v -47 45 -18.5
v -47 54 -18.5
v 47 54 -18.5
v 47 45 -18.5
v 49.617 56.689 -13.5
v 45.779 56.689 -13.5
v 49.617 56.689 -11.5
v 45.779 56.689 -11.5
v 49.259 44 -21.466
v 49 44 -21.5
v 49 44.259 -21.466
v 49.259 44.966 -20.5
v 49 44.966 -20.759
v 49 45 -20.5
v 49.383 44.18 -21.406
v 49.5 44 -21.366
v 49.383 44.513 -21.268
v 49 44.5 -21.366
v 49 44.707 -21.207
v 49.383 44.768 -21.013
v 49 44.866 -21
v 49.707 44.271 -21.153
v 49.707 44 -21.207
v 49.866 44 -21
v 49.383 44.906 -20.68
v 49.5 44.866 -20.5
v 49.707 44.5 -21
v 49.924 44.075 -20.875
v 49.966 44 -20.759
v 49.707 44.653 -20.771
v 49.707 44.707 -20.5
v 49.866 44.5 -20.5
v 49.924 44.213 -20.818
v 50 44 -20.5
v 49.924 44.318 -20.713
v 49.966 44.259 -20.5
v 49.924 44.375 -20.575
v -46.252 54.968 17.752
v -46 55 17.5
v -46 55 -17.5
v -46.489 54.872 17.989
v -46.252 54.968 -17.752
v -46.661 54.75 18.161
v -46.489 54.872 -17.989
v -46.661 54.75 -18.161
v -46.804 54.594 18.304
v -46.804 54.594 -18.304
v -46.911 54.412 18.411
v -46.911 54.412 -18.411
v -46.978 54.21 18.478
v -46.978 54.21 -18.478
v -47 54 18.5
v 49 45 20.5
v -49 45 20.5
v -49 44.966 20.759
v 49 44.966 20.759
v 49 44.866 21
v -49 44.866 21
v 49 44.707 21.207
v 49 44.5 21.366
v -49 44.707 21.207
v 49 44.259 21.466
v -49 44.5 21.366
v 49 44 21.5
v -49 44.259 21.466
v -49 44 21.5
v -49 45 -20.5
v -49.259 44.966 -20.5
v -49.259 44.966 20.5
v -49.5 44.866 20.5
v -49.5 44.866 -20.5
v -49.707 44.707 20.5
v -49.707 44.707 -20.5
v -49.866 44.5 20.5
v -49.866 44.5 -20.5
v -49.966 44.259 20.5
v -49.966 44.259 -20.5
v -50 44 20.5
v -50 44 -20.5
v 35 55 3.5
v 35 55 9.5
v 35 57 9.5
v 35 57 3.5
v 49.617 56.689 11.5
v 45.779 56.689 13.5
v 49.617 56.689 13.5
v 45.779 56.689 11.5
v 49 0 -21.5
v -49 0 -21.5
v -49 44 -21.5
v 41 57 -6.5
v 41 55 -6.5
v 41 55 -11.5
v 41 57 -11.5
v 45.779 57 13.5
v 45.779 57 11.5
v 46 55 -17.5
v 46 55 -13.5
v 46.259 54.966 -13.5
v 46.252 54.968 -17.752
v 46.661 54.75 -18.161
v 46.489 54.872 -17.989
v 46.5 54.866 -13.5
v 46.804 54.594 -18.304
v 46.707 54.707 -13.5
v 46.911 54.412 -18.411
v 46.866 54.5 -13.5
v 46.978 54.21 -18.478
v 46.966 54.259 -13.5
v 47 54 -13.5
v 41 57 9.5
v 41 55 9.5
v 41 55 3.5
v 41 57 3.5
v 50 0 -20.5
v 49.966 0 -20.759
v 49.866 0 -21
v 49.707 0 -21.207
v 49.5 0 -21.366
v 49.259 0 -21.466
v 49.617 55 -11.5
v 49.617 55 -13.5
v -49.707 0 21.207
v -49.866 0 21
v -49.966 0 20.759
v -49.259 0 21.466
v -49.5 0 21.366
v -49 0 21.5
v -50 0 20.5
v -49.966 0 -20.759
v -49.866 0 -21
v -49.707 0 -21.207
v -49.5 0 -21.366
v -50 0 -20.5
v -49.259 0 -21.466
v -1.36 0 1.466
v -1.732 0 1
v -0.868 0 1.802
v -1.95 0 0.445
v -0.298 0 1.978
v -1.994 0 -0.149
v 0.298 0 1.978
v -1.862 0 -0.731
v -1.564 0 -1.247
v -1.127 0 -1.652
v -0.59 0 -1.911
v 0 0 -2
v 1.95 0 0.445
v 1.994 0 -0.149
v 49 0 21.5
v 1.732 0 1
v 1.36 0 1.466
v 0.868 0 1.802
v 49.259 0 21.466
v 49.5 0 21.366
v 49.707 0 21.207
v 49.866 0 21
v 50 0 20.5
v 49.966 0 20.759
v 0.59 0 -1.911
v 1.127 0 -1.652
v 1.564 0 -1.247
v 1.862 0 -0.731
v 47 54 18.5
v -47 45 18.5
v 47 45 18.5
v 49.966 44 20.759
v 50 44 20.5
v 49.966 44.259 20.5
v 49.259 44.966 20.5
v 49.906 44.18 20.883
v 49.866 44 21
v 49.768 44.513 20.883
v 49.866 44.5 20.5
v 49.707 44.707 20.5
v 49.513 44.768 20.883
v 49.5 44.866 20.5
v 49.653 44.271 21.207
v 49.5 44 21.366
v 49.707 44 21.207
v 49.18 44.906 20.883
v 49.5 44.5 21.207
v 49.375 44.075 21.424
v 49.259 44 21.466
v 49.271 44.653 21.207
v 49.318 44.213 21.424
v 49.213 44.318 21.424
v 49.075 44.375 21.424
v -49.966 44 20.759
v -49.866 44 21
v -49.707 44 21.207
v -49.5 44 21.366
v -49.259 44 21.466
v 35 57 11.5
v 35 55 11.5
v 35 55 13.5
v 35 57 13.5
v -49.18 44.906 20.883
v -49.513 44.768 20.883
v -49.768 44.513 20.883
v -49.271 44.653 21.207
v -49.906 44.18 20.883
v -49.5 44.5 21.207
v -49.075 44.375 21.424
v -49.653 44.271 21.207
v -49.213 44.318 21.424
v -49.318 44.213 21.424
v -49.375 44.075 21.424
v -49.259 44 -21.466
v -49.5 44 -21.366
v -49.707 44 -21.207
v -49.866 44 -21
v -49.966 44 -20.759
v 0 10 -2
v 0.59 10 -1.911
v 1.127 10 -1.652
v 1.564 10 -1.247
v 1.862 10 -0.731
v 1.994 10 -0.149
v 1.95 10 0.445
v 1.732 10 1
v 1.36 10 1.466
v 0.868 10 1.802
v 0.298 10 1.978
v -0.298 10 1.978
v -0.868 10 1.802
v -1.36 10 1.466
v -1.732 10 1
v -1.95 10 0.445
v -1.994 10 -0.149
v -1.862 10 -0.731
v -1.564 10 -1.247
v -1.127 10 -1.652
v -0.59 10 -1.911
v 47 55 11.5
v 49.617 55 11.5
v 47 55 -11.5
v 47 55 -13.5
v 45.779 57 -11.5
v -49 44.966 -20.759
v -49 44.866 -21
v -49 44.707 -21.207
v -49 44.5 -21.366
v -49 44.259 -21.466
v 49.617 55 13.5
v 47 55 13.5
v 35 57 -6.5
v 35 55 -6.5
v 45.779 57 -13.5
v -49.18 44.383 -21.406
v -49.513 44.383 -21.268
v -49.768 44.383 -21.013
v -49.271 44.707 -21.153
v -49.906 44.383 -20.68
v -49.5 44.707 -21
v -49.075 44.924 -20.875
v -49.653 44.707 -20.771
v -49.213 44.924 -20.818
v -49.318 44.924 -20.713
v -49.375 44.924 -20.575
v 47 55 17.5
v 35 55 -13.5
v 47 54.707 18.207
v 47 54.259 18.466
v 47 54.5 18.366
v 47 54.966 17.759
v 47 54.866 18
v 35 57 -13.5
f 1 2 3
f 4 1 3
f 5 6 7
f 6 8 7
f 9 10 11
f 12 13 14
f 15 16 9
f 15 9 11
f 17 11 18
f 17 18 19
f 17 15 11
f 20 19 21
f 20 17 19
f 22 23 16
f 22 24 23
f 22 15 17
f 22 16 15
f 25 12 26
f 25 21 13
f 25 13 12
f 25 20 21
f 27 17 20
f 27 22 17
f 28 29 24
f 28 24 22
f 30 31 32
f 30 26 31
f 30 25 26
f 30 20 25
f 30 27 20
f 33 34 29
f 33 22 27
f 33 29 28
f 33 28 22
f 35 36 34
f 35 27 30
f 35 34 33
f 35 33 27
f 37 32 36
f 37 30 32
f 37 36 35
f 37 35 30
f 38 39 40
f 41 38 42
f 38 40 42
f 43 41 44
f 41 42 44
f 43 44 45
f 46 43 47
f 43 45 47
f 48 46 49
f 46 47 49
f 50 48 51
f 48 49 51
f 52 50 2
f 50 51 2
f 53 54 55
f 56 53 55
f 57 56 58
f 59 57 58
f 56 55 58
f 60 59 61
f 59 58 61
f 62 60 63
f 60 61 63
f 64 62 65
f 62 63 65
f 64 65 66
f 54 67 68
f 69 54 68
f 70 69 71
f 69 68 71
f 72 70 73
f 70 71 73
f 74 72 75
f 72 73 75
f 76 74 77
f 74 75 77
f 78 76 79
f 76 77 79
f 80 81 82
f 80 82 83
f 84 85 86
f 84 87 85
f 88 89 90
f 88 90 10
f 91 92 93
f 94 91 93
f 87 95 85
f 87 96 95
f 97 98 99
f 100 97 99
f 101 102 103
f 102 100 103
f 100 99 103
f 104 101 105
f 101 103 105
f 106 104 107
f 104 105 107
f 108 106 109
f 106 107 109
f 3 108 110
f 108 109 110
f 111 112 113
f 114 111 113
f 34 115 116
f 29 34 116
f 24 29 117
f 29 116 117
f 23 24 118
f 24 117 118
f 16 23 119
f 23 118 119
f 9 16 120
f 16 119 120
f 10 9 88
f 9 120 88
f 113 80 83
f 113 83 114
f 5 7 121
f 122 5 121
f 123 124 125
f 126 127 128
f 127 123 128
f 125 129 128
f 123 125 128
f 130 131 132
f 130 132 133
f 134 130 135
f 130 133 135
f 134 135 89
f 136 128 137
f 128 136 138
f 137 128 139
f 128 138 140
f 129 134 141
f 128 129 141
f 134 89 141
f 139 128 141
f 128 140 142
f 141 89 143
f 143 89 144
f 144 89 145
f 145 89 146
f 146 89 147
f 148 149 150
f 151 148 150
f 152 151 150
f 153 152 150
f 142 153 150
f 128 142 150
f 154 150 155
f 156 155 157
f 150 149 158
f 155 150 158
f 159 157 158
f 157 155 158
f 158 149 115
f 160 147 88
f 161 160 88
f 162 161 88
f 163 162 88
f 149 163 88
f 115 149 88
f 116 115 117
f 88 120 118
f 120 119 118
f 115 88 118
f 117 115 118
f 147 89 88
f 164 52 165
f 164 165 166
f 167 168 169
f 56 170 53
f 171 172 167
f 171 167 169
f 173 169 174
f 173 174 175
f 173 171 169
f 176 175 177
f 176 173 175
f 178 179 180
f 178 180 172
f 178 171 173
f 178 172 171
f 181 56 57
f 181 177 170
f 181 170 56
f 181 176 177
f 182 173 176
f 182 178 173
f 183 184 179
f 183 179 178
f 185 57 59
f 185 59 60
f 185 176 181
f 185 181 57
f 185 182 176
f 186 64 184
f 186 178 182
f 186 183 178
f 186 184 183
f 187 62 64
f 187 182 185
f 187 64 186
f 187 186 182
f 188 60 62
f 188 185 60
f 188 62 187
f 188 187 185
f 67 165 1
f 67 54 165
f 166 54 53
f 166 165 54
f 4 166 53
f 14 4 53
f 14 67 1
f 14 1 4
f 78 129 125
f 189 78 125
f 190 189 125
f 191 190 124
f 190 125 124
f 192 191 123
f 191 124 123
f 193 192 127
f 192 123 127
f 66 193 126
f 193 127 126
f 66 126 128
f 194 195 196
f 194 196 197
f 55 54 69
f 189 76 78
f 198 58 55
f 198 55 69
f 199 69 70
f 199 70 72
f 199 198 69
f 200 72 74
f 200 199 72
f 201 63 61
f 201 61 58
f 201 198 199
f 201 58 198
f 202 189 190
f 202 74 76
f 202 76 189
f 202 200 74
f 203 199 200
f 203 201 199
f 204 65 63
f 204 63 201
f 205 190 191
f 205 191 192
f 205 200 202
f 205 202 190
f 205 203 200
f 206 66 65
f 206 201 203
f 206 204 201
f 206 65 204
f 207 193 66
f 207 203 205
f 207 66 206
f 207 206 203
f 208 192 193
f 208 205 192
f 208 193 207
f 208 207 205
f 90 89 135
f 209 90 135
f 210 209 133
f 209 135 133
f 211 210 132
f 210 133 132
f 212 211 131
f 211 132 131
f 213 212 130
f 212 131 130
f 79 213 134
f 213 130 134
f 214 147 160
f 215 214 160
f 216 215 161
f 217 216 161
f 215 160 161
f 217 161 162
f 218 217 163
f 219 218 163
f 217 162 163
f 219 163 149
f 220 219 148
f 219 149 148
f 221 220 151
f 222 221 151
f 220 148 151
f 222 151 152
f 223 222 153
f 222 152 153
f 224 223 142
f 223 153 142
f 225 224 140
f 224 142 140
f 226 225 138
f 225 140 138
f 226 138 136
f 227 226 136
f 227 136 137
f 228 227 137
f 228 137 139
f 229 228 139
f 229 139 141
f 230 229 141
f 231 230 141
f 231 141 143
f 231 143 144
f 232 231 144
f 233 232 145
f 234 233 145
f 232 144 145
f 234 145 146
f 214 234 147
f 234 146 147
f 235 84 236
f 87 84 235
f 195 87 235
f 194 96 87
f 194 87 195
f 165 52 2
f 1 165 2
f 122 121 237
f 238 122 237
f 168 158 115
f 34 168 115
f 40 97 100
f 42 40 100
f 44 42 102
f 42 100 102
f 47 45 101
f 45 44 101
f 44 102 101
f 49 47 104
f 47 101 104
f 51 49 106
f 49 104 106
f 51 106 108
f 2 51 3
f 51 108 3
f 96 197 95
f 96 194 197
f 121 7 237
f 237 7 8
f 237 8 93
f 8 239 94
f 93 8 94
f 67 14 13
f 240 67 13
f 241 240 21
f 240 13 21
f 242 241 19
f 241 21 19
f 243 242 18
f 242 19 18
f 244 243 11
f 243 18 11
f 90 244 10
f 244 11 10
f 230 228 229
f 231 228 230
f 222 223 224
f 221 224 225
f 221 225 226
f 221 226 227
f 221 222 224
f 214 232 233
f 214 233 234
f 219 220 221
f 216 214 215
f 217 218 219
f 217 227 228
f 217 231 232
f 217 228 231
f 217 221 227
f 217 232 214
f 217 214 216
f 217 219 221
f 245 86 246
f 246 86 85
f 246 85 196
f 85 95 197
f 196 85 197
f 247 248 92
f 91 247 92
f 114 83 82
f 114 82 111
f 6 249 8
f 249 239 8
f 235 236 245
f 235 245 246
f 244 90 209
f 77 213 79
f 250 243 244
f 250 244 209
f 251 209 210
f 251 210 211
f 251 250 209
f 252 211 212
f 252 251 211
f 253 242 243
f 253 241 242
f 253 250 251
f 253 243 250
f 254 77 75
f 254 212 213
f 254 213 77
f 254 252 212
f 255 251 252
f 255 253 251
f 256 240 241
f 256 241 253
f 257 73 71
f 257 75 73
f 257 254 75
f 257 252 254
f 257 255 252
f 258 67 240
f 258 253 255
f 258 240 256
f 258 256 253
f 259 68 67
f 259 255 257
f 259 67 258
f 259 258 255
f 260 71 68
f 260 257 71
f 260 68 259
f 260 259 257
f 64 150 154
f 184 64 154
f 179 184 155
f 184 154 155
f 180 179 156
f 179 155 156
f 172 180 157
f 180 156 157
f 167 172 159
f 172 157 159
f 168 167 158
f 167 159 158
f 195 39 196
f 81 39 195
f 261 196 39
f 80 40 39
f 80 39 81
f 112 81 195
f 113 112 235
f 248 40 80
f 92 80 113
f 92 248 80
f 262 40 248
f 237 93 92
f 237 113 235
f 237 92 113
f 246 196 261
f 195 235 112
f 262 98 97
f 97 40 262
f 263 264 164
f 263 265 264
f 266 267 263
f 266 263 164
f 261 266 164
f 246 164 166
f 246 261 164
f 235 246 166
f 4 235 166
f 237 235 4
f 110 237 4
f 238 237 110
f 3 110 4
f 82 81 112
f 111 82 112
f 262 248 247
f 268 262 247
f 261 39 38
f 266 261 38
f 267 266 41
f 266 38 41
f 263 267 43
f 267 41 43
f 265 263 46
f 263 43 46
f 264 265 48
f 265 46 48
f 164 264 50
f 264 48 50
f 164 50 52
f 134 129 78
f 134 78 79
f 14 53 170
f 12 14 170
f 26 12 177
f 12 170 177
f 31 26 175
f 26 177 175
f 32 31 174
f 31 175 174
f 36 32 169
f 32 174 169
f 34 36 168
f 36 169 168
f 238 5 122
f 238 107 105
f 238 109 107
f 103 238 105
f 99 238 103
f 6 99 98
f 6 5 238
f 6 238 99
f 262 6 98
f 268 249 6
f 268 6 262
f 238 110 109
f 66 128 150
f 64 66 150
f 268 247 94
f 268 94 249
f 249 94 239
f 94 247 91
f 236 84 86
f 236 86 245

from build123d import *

# Parameters (mm, degrees)
SKETCH1_W           = 100
SKETCH1_H           = 43
BOSS_EXTRUDE1_DEPTH = 55
SKETCH2_W           = 100
SKETCH2_H           = 43
SKETCH2_W_2         = 94
SKETCH2_H_2         = 37
SKETCH2_W_3         = 6
SKETCH2_H_3         = 6
CUT_EXTRUDE1_DEPTH  = 10
SKETCH3_W           = 6
SKETCH3_H           = 6
BOSS_EXTRUDE2_DEPTH = 12
SKETCH7_R           = 2
CUT_EXTRUDE2_DEPTH  = 10
SKETCH4_W           = 6
SKETCH4_H           = 6
BOSS_EXTRUDE3_DEPTH = 12
BOSS_EXTRUDE4_DEPTH = 1
FILLET1_R           = 1


with BuildPart() as part:
    # Sketch1 → Boss-Extrude1 (new body)
    with BuildSketch(Plane(origin=(0, 0, 0), x_dir=(1, 0, 0), z_dir=(0, 1, 0))):
        Rectangle(SKETCH1_W, SKETCH1_H)
    extrude(amount=BOSS_EXTRUDE1_DEPTH)

    # Sketch2 → Cut-Extrude1 (cut)
    # profile 1 of 3: a face of its own
    with BuildSketch(Plane(origin=(0, 55, 0), x_dir=(1, 0, 0), z_dir=(0, 1, 0))):
        Rectangle(SKETCH2_W, SKETCH2_H)
        Rectangle(SKETCH2_W_2, SKETCH2_H_2, mode=Mode.SUBTRACT)
    # profile 2 of 3: a face of its own
    with BuildSketch(Plane(origin=(0, 55, 0), x_dir=(1, 0, 0), z_dir=(0, 1, 0))):
        with Locations((38, 9.5)):
            Rectangle(SKETCH2_W_3, SKETCH2_H_3)
    # profile 3 of 3: a face of its own
    with BuildSketch(Plane(origin=(0, 55, 0), x_dir=(1, 0, 0), z_dir=(0, 1, 0))):
        with Locations((38, -6.5)):
            Rectangle(SKETCH2_W_3, SKETCH2_H_3)
    extrude(amount=-CUT_EXTRUDE1_DEPTH, mode=Mode.SUBTRACT)

    # Sketch3 → Boss-Extrude2 (add)
    with BuildSketch(Plane(origin=(0, 45, 0), x_dir=(1, 0, 0), z_dir=(0, 1, 0))):
        with Locations((38, -6.5)):
            Rectangle(SKETCH3_W, SKETCH3_H)
    extrude(amount=BOSS_EXTRUDE2_DEPTH)

    # Sketch7 → Cut-Extrude2 (cut)
    with BuildSketch(Plane.XZ):
        with Locations(Location((0, 0, 0), (0, 0, 270))):
            Circle(SKETCH7_R)
    extrude(amount=-CUT_EXTRUDE2_DEPTH, mode=Mode.SUBTRACT)

    # Sketch4 → Boss-Extrude3 (add)
    with BuildSketch(Plane(origin=(0, 45, 0), x_dir=(1, 0, 0), z_dir=(0, 1, 0))):
        with Locations((38, 9.5)):
            Rectangle(SKETCH4_W, SKETCH4_H)
    extrude(amount=BOSS_EXTRUDE3_DEPTH)

    # Sketch5 → Boss-Extrude4 (add, symmetric)
    with BuildSketch(Plane.XY.offset(-12.5)):
        Polygon((35, 55), (35, 57), (45.779010746, 57), (45.779010746, 56.689423242), (49.616852111, 56.689423242), (49.616852111, 55), align=None)
    boss_extrude4 = extrude(amount=BOSS_EXTRUDE4_DEPTH, both=True)

    # Mirror1: Boss-Extrude4 across plane
    add(boss_extrude4.mirror(Plane.XY))

    # Fillet1
    # the kernel refuses this fillet: 1 mm, written as the material it takes off along each edge
    with BuildSketch(Plane(origin=(-49, 44, 20.5), x_dir=(0, 1, 0), z_dir=(0, 0, 1))) as fillet1_piece_1_section:
        Polygon((0, 0), (FILLET1_R * 1.02, 0), (FILLET1_R * 1.02, FILLET1_R * 1.02), (0, FILLET1_R * 1.02), align=None)
    fillet1_piece_1 = extrude(amount=FILLET1_R * 1.02, mode=Mode.PRIVATE)
    fillet1_piece_1 = fillet1_piece_1 - Plane(origin=(-49, 44, 20.5), x_dir=(0.7071067811865475, -0.7071067811865475, 0), z_dir=(0, 0, 1)) * Sphere(FILLET1_R, mode=Mode.PRIVATE)
    add(fillet1_piece_1, mode=Mode.SUBTRACT)
    with BuildSketch(Plane(origin=(49, 44, 20.5), x_dir=(1, 0, 0), z_dir=(0, 0, 1))) as fillet1_piece_2_section:
        Polygon((0, 0), (FILLET1_R * 1.02, 0), (FILLET1_R * 1.02, FILLET1_R * 1.02), (0, FILLET1_R * 1.02), align=None)
    fillet1_piece_2 = extrude(amount=FILLET1_R * 1.02, mode=Mode.PRIVATE)
    fillet1_piece_2 = fillet1_piece_2 - Plane(origin=(49, 44, 20.5), x_dir=(-0.7071067811865475, -0.7071067811865475, 0), z_dir=(0, 0, 1)) * Sphere(FILLET1_R, mode=Mode.PRIVATE)
    add(fillet1_piece_2, mode=Mode.SUBTRACT)
    with BuildSketch(Plane(origin=(49, 44, -20.5), x_dir=(0, 1, 0), z_dir=(1, 0, 0))) as fillet1_piece_3_section:
        Polygon((0, 0), (FILLET1_R * 1.02, 0), (FILLET1_R * 1.02, -FILLET1_R * 1.02), (0, -FILLET1_R * 1.02), align=None)
    fillet1_piece_3 = extrude(amount=FILLET1_R * 1.02, mode=Mode.PRIVATE)
    fillet1_piece_3 = fillet1_piece_3 - Plane(origin=(49, 44, -20.5), x_dir=(0, -0.7071067811865475, 0.7071067811865475), z_dir=(1, 0, 0)) * Sphere(FILLET1_R, mode=Mode.PRIVATE)
    add(fillet1_piece_3, mode=Mode.SUBTRACT)
    with BuildSketch(Plane(origin=(-49, 44, -20.5), x_dir=(-1, 0, 0), z_dir=(0, 1, 0))) as fillet1_piece_4_section:
        Polygon((0, 0), (FILLET1_R * 1.02, 0), (FILLET1_R * 1.02, -FILLET1_R * 1.02), (0, -FILLET1_R * 1.02), align=None)
    fillet1_piece_4 = extrude(amount=FILLET1_R * 1.02, mode=Mode.PRIVATE)
    fillet1_piece_4 = fillet1_piece_4 - Plane(origin=(-49, 44, -20.5), x_dir=(0.7071067811865475, 0, 0.7071067811865475), z_dir=(0, 1, 0)) * Sphere(FILLET1_R, mode=Mode.PRIVATE)
    add(fillet1_piece_4, mode=Mode.SUBTRACT)
    with BuildSketch(Plane(origin=(-50, -2.5, 21.5), x_dir=(1, 0, 0), z_dir=(0, 1, 0)), Plane(origin=(-50, -2.5, -21.5), x_dir=(0, 0, 1), z_dir=(0, 1, 0))) as fillet1_piece_5:
        with BuildLine():
            CenterArc((FILLET1_R, FILLET1_R), FILLET1_R, 180, 90)
            Line((0, FILLET1_R), (0, 0))
            Line((0, 0), (FILLET1_R, 0))
        make_face()
    extrude(amount=46.5, mode=Mode.SUBTRACT)
    with BuildSketch(Plane(origin=(50, -2.5, 21.5), x_dir=(-1, 0, 0), z_dir=(0, 1, 0)), Plane(origin=(50, -2.5, -21.5), x_dir=(0, 0, 1), z_dir=(0, 1, 0))) as fillet1_piece_6:
        with BuildLine():
            CenterArc((FILLET1_R, -FILLET1_R), FILLET1_R, 90, 90)
            Line((0, -FILLET1_R), (0, 0))
            Line((0, 0), (FILLET1_R, 0))
        make_face()
    extrude(amount=46.5, mode=Mode.SUBTRACT)
    with BuildSketch(Plane(origin=(49, 45, -21.5), x_dir=(0, 0, 1), z_dir=(-1, 0, 0))) as fillet1_piece_7:
        with BuildLine():
            CenterArc((FILLET1_R, -FILLET1_R), FILLET1_R, 90, 90)
            Line((0, -FILLET1_R), (0, 0))
            Line((0, 0), (FILLET1_R, 0))
        make_face()
    extrude(amount=98, mode=Mode.SUBTRACT)
    with BuildSketch(Plane(origin=(-50, 45, -20.5), x_dir=(1, 0, 0), z_dir=(0, 0, 1))) as fillet1_piece_8:
        with BuildLine():
            CenterArc((FILLET1_R, -FILLET1_R), FILLET1_R, 90, 90)
            Line((0, -FILLET1_R), (0, 0))
            Line((0, 0), (FILLET1_R, 0))
        make_face()
    extrude(amount=41, mode=Mode.SUBTRACT)
    with BuildSketch(Plane(origin=(-49, 45, 21.5), x_dir=(0, -1, 0), z_dir=(1, 0, 0))) as fillet1_piece_9:
        with BuildLine():
            CenterArc((FILLET1_R, FILLET1_R), FILLET1_R, 180, 90)
            Line((0, FILLET1_R), (0, 0))
            Line((0, 0), (FILLET1_R, 0))
        make_face()
    extrude(amount=98, mode=Mode.SUBTRACT)
    with BuildSketch(Plane(origin=(50, 45, 20.5), x_dir=(0, -1, 0), z_dir=(0, 0, -1))) as fillet1_piece_10:
        with BuildLine():
            CenterArc((FILLET1_R, FILLET1_R), FILLET1_R, 180, 90)
            Line((0, FILLET1_R), (0, 0))
            Line((0, 0), (FILLET1_R, 0))
        make_face()
    extrude(amount=41, mode=Mode.SUBTRACT)
    with BuildSketch(Plane(origin=(47, 55, -13.5), x_dir=(0, -1, 0), z_dir=(0, 0, -1))) as fillet1_piece_11:
        with BuildLine():
            CenterArc((FILLET1_R, FILLET1_R), FILLET1_R, 180, 90)
            Line((0, FILLET1_R), (0, 0))
            Line((0, 0), (FILLET1_R, 0))
        make_face()
    extrude(amount=7.5, mode=Mode.SUBTRACT)
    with BuildSketch(Plane(origin=(-49.5, 55, 18.5), x_dir=(0, -1, 0), z_dir=(1, 0, 0)), Plane(origin=(49.5, 55, -18.5), x_dir=(0, -1, 0), z_dir=(-1, 0, 0))) as fillet1_piece_12:
        with BuildLine():
            CenterArc((FILLET1_R, FILLET1_R), FILLET1_R, 180, 90)
            Line((0, FILLET1_R), (0, 0))
            Line((0, 0), (FILLET1_R, 0))
        make_face()
    extrude(amount=99, mode=Mode.SUBTRACT)
    with BuildSketch(Plane(origin=(-47, 55, -21), x_dir=(0, -1, 0), z_dir=(0, 0, 1))) as fillet1_piece_13:
        with BuildLine():
            CenterArc((FILLET1_R, FILLET1_R), FILLET1_R, 180, 90)
            Line((0, FILLET1_R), (0, 0))
            Line((0, 0), (FILLET1_R, 0))
        make_face()
    extrude(amount=42, mode=Mode.SUBTRACT)


solid = part.part
